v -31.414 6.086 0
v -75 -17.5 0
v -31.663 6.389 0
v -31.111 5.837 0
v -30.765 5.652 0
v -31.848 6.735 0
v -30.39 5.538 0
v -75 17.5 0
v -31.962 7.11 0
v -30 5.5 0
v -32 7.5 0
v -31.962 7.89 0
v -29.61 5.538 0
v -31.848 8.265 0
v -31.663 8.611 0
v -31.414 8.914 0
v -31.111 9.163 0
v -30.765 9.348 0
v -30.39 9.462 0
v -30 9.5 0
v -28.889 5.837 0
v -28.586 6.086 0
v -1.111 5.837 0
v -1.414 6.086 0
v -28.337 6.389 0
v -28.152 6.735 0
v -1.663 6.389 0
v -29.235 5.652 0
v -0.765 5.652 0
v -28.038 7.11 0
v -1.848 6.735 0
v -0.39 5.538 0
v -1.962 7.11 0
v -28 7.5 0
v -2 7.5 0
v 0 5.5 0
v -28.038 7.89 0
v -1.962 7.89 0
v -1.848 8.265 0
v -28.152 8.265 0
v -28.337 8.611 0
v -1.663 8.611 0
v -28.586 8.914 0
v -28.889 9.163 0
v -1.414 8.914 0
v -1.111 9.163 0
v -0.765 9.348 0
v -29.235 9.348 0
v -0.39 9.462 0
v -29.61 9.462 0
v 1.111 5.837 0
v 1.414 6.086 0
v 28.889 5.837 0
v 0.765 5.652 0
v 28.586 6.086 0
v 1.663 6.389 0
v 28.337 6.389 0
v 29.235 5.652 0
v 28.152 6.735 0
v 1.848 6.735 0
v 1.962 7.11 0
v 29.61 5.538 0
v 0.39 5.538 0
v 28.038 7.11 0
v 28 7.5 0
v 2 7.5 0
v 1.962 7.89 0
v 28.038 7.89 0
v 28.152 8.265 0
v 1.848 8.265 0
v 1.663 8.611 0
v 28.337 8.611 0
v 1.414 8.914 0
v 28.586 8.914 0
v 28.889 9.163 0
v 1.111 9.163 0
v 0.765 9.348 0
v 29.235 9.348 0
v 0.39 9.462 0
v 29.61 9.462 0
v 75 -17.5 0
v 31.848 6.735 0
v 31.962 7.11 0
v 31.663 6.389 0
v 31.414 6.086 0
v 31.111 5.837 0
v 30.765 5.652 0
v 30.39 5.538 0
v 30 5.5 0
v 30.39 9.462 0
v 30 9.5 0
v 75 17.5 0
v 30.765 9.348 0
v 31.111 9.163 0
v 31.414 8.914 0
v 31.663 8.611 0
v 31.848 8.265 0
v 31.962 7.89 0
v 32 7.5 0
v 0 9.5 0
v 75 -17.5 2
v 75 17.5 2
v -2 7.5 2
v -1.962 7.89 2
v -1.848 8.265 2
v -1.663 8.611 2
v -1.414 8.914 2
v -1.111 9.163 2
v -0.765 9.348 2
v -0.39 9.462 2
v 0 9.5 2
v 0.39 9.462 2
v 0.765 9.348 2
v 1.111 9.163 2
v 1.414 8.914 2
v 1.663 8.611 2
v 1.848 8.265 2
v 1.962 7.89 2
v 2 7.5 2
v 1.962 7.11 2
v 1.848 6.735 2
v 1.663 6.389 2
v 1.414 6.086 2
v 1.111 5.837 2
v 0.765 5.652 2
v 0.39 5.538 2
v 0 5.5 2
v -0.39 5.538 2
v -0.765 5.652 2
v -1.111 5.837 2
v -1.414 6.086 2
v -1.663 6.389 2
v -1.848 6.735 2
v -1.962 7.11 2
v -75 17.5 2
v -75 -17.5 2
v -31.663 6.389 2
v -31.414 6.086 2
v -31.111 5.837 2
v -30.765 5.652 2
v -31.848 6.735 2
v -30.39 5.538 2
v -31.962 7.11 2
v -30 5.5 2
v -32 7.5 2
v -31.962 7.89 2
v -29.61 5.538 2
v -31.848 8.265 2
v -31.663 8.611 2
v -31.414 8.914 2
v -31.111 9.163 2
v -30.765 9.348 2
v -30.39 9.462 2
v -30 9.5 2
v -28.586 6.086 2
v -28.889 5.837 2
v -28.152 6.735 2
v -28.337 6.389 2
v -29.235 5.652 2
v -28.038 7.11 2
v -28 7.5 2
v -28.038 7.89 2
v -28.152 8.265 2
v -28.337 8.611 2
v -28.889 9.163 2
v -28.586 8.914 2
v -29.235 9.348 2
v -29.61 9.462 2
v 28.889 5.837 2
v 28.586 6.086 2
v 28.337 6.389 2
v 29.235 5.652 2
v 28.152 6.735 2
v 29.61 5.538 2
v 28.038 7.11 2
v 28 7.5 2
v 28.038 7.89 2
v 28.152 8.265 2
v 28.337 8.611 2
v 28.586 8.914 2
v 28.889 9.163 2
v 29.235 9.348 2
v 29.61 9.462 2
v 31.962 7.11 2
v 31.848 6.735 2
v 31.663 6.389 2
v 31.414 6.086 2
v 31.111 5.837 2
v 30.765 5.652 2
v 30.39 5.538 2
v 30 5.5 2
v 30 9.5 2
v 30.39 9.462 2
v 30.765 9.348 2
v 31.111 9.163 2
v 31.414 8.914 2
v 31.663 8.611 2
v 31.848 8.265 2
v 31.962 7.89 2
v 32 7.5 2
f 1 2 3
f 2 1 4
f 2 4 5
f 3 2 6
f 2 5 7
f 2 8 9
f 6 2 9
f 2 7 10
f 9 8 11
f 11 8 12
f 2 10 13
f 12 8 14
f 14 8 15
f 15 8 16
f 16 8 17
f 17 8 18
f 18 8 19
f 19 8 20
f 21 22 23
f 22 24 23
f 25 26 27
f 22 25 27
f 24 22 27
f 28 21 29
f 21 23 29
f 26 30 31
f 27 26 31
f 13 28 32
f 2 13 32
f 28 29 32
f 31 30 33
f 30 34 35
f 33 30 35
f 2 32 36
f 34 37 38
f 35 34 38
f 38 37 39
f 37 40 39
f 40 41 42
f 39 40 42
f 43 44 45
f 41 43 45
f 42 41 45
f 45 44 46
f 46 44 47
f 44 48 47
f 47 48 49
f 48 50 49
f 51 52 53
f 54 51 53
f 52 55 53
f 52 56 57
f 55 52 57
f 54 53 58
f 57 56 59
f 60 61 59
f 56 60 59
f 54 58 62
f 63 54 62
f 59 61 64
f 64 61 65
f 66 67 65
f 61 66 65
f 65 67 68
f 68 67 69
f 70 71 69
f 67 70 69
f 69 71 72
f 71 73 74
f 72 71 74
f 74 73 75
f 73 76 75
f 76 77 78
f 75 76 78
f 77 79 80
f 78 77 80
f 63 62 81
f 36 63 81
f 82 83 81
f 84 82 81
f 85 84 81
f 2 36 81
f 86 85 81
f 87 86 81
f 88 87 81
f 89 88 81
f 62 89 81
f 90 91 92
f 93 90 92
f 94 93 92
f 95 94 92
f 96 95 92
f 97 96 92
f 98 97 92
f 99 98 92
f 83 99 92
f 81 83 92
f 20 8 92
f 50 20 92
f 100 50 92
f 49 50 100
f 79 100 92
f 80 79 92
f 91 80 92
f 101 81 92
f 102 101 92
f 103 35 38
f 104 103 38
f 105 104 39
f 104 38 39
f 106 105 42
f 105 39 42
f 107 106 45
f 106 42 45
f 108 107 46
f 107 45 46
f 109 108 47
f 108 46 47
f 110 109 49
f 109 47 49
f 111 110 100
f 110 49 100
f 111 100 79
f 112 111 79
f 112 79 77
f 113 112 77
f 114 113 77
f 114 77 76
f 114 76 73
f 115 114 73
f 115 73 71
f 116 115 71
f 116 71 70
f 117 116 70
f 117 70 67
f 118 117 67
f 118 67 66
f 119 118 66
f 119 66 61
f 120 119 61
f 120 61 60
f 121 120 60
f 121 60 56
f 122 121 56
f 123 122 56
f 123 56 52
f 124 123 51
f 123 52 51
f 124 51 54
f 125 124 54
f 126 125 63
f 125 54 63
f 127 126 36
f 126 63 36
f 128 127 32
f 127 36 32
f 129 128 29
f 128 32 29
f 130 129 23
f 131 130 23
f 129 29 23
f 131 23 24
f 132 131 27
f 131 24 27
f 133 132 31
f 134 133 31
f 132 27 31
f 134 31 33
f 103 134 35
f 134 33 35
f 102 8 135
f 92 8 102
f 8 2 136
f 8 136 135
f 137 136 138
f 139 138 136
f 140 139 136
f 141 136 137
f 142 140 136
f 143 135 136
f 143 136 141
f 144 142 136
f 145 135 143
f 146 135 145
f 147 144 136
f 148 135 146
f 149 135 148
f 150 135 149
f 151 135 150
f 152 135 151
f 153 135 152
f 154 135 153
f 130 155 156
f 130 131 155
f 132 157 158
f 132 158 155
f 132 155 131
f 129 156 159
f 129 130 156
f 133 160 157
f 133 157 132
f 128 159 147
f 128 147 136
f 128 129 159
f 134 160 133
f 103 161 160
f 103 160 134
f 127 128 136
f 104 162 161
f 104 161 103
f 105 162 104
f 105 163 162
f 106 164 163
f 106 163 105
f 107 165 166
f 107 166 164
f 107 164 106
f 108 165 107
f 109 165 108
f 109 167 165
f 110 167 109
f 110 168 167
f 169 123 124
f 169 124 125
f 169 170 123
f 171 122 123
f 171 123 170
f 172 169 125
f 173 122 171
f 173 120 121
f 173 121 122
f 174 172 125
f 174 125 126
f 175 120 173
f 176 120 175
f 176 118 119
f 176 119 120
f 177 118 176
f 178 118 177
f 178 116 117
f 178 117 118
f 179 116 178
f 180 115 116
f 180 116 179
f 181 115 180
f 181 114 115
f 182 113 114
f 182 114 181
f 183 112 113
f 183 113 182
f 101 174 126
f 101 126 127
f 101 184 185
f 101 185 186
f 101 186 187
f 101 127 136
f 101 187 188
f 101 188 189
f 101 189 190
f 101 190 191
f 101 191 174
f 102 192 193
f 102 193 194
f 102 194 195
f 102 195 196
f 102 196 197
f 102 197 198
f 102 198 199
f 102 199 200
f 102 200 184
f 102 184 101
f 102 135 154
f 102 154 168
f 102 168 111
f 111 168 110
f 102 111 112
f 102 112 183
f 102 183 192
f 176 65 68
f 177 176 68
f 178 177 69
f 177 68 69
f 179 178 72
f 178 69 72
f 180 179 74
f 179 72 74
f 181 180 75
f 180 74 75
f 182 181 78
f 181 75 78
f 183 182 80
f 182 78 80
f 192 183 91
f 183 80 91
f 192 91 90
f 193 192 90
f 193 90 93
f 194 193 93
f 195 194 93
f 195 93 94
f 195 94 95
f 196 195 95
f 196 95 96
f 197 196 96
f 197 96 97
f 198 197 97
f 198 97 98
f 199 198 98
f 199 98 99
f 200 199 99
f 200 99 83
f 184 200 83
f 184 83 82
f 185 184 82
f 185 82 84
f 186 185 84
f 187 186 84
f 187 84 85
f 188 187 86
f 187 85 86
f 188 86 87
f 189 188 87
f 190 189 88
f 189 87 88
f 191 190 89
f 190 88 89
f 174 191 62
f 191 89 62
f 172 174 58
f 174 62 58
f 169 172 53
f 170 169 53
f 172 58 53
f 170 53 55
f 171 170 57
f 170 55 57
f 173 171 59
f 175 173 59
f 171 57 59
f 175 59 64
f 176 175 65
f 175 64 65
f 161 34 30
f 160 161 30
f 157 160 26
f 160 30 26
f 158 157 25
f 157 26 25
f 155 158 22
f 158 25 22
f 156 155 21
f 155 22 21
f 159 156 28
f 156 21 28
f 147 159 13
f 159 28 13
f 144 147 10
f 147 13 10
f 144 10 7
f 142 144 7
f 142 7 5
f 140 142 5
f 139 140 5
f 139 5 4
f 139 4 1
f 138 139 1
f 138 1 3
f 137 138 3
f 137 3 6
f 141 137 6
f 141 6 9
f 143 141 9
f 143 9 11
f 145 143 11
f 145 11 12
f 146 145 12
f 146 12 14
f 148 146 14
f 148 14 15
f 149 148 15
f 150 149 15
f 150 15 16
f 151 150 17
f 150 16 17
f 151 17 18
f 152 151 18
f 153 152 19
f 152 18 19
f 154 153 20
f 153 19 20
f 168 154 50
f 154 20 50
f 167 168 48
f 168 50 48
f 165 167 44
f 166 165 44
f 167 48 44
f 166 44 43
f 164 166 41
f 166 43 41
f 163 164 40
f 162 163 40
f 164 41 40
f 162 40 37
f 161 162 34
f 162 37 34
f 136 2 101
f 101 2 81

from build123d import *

# Parameters (mm, degrees)
SKETCH1_W           = 150
SKETCH1_H           = 35
BOSS_EXTRUDE1_DEPTH = 2
SKETCH2_R           = 2
FIX_HOLE_DEPTH      = 78.040573726


with BuildPart() as part:
    # Sketch1 → Boss-Extrude1 (new body)
    with BuildSketch(Plane.XY):
        Rectangle(SKETCH1_W, SKETCH1_H)
    extrude(amount=BOSS_EXTRUDE1_DEPTH)

    # Sketch2 → fix hole (cut, through all)
    with BuildSketch(Plane(origin=(0, 0, 0), x_dir=(-1, 0, 0), z_dir=(0, 0, -1))):
        with Locations(Location((30, 7.5, 0), (0, 0, 180))):
            Circle(SKETCH2_R)
        with Locations((0, 7.5)):
            Circle(SKETCH2_R)
        with Locations((-30, 7.5)):
            Circle(SKETCH2_R)
    extrude(amount=-FIX_HOLE_DEPTH, mode=Mode.SUBTRACT)


solid = part.part
